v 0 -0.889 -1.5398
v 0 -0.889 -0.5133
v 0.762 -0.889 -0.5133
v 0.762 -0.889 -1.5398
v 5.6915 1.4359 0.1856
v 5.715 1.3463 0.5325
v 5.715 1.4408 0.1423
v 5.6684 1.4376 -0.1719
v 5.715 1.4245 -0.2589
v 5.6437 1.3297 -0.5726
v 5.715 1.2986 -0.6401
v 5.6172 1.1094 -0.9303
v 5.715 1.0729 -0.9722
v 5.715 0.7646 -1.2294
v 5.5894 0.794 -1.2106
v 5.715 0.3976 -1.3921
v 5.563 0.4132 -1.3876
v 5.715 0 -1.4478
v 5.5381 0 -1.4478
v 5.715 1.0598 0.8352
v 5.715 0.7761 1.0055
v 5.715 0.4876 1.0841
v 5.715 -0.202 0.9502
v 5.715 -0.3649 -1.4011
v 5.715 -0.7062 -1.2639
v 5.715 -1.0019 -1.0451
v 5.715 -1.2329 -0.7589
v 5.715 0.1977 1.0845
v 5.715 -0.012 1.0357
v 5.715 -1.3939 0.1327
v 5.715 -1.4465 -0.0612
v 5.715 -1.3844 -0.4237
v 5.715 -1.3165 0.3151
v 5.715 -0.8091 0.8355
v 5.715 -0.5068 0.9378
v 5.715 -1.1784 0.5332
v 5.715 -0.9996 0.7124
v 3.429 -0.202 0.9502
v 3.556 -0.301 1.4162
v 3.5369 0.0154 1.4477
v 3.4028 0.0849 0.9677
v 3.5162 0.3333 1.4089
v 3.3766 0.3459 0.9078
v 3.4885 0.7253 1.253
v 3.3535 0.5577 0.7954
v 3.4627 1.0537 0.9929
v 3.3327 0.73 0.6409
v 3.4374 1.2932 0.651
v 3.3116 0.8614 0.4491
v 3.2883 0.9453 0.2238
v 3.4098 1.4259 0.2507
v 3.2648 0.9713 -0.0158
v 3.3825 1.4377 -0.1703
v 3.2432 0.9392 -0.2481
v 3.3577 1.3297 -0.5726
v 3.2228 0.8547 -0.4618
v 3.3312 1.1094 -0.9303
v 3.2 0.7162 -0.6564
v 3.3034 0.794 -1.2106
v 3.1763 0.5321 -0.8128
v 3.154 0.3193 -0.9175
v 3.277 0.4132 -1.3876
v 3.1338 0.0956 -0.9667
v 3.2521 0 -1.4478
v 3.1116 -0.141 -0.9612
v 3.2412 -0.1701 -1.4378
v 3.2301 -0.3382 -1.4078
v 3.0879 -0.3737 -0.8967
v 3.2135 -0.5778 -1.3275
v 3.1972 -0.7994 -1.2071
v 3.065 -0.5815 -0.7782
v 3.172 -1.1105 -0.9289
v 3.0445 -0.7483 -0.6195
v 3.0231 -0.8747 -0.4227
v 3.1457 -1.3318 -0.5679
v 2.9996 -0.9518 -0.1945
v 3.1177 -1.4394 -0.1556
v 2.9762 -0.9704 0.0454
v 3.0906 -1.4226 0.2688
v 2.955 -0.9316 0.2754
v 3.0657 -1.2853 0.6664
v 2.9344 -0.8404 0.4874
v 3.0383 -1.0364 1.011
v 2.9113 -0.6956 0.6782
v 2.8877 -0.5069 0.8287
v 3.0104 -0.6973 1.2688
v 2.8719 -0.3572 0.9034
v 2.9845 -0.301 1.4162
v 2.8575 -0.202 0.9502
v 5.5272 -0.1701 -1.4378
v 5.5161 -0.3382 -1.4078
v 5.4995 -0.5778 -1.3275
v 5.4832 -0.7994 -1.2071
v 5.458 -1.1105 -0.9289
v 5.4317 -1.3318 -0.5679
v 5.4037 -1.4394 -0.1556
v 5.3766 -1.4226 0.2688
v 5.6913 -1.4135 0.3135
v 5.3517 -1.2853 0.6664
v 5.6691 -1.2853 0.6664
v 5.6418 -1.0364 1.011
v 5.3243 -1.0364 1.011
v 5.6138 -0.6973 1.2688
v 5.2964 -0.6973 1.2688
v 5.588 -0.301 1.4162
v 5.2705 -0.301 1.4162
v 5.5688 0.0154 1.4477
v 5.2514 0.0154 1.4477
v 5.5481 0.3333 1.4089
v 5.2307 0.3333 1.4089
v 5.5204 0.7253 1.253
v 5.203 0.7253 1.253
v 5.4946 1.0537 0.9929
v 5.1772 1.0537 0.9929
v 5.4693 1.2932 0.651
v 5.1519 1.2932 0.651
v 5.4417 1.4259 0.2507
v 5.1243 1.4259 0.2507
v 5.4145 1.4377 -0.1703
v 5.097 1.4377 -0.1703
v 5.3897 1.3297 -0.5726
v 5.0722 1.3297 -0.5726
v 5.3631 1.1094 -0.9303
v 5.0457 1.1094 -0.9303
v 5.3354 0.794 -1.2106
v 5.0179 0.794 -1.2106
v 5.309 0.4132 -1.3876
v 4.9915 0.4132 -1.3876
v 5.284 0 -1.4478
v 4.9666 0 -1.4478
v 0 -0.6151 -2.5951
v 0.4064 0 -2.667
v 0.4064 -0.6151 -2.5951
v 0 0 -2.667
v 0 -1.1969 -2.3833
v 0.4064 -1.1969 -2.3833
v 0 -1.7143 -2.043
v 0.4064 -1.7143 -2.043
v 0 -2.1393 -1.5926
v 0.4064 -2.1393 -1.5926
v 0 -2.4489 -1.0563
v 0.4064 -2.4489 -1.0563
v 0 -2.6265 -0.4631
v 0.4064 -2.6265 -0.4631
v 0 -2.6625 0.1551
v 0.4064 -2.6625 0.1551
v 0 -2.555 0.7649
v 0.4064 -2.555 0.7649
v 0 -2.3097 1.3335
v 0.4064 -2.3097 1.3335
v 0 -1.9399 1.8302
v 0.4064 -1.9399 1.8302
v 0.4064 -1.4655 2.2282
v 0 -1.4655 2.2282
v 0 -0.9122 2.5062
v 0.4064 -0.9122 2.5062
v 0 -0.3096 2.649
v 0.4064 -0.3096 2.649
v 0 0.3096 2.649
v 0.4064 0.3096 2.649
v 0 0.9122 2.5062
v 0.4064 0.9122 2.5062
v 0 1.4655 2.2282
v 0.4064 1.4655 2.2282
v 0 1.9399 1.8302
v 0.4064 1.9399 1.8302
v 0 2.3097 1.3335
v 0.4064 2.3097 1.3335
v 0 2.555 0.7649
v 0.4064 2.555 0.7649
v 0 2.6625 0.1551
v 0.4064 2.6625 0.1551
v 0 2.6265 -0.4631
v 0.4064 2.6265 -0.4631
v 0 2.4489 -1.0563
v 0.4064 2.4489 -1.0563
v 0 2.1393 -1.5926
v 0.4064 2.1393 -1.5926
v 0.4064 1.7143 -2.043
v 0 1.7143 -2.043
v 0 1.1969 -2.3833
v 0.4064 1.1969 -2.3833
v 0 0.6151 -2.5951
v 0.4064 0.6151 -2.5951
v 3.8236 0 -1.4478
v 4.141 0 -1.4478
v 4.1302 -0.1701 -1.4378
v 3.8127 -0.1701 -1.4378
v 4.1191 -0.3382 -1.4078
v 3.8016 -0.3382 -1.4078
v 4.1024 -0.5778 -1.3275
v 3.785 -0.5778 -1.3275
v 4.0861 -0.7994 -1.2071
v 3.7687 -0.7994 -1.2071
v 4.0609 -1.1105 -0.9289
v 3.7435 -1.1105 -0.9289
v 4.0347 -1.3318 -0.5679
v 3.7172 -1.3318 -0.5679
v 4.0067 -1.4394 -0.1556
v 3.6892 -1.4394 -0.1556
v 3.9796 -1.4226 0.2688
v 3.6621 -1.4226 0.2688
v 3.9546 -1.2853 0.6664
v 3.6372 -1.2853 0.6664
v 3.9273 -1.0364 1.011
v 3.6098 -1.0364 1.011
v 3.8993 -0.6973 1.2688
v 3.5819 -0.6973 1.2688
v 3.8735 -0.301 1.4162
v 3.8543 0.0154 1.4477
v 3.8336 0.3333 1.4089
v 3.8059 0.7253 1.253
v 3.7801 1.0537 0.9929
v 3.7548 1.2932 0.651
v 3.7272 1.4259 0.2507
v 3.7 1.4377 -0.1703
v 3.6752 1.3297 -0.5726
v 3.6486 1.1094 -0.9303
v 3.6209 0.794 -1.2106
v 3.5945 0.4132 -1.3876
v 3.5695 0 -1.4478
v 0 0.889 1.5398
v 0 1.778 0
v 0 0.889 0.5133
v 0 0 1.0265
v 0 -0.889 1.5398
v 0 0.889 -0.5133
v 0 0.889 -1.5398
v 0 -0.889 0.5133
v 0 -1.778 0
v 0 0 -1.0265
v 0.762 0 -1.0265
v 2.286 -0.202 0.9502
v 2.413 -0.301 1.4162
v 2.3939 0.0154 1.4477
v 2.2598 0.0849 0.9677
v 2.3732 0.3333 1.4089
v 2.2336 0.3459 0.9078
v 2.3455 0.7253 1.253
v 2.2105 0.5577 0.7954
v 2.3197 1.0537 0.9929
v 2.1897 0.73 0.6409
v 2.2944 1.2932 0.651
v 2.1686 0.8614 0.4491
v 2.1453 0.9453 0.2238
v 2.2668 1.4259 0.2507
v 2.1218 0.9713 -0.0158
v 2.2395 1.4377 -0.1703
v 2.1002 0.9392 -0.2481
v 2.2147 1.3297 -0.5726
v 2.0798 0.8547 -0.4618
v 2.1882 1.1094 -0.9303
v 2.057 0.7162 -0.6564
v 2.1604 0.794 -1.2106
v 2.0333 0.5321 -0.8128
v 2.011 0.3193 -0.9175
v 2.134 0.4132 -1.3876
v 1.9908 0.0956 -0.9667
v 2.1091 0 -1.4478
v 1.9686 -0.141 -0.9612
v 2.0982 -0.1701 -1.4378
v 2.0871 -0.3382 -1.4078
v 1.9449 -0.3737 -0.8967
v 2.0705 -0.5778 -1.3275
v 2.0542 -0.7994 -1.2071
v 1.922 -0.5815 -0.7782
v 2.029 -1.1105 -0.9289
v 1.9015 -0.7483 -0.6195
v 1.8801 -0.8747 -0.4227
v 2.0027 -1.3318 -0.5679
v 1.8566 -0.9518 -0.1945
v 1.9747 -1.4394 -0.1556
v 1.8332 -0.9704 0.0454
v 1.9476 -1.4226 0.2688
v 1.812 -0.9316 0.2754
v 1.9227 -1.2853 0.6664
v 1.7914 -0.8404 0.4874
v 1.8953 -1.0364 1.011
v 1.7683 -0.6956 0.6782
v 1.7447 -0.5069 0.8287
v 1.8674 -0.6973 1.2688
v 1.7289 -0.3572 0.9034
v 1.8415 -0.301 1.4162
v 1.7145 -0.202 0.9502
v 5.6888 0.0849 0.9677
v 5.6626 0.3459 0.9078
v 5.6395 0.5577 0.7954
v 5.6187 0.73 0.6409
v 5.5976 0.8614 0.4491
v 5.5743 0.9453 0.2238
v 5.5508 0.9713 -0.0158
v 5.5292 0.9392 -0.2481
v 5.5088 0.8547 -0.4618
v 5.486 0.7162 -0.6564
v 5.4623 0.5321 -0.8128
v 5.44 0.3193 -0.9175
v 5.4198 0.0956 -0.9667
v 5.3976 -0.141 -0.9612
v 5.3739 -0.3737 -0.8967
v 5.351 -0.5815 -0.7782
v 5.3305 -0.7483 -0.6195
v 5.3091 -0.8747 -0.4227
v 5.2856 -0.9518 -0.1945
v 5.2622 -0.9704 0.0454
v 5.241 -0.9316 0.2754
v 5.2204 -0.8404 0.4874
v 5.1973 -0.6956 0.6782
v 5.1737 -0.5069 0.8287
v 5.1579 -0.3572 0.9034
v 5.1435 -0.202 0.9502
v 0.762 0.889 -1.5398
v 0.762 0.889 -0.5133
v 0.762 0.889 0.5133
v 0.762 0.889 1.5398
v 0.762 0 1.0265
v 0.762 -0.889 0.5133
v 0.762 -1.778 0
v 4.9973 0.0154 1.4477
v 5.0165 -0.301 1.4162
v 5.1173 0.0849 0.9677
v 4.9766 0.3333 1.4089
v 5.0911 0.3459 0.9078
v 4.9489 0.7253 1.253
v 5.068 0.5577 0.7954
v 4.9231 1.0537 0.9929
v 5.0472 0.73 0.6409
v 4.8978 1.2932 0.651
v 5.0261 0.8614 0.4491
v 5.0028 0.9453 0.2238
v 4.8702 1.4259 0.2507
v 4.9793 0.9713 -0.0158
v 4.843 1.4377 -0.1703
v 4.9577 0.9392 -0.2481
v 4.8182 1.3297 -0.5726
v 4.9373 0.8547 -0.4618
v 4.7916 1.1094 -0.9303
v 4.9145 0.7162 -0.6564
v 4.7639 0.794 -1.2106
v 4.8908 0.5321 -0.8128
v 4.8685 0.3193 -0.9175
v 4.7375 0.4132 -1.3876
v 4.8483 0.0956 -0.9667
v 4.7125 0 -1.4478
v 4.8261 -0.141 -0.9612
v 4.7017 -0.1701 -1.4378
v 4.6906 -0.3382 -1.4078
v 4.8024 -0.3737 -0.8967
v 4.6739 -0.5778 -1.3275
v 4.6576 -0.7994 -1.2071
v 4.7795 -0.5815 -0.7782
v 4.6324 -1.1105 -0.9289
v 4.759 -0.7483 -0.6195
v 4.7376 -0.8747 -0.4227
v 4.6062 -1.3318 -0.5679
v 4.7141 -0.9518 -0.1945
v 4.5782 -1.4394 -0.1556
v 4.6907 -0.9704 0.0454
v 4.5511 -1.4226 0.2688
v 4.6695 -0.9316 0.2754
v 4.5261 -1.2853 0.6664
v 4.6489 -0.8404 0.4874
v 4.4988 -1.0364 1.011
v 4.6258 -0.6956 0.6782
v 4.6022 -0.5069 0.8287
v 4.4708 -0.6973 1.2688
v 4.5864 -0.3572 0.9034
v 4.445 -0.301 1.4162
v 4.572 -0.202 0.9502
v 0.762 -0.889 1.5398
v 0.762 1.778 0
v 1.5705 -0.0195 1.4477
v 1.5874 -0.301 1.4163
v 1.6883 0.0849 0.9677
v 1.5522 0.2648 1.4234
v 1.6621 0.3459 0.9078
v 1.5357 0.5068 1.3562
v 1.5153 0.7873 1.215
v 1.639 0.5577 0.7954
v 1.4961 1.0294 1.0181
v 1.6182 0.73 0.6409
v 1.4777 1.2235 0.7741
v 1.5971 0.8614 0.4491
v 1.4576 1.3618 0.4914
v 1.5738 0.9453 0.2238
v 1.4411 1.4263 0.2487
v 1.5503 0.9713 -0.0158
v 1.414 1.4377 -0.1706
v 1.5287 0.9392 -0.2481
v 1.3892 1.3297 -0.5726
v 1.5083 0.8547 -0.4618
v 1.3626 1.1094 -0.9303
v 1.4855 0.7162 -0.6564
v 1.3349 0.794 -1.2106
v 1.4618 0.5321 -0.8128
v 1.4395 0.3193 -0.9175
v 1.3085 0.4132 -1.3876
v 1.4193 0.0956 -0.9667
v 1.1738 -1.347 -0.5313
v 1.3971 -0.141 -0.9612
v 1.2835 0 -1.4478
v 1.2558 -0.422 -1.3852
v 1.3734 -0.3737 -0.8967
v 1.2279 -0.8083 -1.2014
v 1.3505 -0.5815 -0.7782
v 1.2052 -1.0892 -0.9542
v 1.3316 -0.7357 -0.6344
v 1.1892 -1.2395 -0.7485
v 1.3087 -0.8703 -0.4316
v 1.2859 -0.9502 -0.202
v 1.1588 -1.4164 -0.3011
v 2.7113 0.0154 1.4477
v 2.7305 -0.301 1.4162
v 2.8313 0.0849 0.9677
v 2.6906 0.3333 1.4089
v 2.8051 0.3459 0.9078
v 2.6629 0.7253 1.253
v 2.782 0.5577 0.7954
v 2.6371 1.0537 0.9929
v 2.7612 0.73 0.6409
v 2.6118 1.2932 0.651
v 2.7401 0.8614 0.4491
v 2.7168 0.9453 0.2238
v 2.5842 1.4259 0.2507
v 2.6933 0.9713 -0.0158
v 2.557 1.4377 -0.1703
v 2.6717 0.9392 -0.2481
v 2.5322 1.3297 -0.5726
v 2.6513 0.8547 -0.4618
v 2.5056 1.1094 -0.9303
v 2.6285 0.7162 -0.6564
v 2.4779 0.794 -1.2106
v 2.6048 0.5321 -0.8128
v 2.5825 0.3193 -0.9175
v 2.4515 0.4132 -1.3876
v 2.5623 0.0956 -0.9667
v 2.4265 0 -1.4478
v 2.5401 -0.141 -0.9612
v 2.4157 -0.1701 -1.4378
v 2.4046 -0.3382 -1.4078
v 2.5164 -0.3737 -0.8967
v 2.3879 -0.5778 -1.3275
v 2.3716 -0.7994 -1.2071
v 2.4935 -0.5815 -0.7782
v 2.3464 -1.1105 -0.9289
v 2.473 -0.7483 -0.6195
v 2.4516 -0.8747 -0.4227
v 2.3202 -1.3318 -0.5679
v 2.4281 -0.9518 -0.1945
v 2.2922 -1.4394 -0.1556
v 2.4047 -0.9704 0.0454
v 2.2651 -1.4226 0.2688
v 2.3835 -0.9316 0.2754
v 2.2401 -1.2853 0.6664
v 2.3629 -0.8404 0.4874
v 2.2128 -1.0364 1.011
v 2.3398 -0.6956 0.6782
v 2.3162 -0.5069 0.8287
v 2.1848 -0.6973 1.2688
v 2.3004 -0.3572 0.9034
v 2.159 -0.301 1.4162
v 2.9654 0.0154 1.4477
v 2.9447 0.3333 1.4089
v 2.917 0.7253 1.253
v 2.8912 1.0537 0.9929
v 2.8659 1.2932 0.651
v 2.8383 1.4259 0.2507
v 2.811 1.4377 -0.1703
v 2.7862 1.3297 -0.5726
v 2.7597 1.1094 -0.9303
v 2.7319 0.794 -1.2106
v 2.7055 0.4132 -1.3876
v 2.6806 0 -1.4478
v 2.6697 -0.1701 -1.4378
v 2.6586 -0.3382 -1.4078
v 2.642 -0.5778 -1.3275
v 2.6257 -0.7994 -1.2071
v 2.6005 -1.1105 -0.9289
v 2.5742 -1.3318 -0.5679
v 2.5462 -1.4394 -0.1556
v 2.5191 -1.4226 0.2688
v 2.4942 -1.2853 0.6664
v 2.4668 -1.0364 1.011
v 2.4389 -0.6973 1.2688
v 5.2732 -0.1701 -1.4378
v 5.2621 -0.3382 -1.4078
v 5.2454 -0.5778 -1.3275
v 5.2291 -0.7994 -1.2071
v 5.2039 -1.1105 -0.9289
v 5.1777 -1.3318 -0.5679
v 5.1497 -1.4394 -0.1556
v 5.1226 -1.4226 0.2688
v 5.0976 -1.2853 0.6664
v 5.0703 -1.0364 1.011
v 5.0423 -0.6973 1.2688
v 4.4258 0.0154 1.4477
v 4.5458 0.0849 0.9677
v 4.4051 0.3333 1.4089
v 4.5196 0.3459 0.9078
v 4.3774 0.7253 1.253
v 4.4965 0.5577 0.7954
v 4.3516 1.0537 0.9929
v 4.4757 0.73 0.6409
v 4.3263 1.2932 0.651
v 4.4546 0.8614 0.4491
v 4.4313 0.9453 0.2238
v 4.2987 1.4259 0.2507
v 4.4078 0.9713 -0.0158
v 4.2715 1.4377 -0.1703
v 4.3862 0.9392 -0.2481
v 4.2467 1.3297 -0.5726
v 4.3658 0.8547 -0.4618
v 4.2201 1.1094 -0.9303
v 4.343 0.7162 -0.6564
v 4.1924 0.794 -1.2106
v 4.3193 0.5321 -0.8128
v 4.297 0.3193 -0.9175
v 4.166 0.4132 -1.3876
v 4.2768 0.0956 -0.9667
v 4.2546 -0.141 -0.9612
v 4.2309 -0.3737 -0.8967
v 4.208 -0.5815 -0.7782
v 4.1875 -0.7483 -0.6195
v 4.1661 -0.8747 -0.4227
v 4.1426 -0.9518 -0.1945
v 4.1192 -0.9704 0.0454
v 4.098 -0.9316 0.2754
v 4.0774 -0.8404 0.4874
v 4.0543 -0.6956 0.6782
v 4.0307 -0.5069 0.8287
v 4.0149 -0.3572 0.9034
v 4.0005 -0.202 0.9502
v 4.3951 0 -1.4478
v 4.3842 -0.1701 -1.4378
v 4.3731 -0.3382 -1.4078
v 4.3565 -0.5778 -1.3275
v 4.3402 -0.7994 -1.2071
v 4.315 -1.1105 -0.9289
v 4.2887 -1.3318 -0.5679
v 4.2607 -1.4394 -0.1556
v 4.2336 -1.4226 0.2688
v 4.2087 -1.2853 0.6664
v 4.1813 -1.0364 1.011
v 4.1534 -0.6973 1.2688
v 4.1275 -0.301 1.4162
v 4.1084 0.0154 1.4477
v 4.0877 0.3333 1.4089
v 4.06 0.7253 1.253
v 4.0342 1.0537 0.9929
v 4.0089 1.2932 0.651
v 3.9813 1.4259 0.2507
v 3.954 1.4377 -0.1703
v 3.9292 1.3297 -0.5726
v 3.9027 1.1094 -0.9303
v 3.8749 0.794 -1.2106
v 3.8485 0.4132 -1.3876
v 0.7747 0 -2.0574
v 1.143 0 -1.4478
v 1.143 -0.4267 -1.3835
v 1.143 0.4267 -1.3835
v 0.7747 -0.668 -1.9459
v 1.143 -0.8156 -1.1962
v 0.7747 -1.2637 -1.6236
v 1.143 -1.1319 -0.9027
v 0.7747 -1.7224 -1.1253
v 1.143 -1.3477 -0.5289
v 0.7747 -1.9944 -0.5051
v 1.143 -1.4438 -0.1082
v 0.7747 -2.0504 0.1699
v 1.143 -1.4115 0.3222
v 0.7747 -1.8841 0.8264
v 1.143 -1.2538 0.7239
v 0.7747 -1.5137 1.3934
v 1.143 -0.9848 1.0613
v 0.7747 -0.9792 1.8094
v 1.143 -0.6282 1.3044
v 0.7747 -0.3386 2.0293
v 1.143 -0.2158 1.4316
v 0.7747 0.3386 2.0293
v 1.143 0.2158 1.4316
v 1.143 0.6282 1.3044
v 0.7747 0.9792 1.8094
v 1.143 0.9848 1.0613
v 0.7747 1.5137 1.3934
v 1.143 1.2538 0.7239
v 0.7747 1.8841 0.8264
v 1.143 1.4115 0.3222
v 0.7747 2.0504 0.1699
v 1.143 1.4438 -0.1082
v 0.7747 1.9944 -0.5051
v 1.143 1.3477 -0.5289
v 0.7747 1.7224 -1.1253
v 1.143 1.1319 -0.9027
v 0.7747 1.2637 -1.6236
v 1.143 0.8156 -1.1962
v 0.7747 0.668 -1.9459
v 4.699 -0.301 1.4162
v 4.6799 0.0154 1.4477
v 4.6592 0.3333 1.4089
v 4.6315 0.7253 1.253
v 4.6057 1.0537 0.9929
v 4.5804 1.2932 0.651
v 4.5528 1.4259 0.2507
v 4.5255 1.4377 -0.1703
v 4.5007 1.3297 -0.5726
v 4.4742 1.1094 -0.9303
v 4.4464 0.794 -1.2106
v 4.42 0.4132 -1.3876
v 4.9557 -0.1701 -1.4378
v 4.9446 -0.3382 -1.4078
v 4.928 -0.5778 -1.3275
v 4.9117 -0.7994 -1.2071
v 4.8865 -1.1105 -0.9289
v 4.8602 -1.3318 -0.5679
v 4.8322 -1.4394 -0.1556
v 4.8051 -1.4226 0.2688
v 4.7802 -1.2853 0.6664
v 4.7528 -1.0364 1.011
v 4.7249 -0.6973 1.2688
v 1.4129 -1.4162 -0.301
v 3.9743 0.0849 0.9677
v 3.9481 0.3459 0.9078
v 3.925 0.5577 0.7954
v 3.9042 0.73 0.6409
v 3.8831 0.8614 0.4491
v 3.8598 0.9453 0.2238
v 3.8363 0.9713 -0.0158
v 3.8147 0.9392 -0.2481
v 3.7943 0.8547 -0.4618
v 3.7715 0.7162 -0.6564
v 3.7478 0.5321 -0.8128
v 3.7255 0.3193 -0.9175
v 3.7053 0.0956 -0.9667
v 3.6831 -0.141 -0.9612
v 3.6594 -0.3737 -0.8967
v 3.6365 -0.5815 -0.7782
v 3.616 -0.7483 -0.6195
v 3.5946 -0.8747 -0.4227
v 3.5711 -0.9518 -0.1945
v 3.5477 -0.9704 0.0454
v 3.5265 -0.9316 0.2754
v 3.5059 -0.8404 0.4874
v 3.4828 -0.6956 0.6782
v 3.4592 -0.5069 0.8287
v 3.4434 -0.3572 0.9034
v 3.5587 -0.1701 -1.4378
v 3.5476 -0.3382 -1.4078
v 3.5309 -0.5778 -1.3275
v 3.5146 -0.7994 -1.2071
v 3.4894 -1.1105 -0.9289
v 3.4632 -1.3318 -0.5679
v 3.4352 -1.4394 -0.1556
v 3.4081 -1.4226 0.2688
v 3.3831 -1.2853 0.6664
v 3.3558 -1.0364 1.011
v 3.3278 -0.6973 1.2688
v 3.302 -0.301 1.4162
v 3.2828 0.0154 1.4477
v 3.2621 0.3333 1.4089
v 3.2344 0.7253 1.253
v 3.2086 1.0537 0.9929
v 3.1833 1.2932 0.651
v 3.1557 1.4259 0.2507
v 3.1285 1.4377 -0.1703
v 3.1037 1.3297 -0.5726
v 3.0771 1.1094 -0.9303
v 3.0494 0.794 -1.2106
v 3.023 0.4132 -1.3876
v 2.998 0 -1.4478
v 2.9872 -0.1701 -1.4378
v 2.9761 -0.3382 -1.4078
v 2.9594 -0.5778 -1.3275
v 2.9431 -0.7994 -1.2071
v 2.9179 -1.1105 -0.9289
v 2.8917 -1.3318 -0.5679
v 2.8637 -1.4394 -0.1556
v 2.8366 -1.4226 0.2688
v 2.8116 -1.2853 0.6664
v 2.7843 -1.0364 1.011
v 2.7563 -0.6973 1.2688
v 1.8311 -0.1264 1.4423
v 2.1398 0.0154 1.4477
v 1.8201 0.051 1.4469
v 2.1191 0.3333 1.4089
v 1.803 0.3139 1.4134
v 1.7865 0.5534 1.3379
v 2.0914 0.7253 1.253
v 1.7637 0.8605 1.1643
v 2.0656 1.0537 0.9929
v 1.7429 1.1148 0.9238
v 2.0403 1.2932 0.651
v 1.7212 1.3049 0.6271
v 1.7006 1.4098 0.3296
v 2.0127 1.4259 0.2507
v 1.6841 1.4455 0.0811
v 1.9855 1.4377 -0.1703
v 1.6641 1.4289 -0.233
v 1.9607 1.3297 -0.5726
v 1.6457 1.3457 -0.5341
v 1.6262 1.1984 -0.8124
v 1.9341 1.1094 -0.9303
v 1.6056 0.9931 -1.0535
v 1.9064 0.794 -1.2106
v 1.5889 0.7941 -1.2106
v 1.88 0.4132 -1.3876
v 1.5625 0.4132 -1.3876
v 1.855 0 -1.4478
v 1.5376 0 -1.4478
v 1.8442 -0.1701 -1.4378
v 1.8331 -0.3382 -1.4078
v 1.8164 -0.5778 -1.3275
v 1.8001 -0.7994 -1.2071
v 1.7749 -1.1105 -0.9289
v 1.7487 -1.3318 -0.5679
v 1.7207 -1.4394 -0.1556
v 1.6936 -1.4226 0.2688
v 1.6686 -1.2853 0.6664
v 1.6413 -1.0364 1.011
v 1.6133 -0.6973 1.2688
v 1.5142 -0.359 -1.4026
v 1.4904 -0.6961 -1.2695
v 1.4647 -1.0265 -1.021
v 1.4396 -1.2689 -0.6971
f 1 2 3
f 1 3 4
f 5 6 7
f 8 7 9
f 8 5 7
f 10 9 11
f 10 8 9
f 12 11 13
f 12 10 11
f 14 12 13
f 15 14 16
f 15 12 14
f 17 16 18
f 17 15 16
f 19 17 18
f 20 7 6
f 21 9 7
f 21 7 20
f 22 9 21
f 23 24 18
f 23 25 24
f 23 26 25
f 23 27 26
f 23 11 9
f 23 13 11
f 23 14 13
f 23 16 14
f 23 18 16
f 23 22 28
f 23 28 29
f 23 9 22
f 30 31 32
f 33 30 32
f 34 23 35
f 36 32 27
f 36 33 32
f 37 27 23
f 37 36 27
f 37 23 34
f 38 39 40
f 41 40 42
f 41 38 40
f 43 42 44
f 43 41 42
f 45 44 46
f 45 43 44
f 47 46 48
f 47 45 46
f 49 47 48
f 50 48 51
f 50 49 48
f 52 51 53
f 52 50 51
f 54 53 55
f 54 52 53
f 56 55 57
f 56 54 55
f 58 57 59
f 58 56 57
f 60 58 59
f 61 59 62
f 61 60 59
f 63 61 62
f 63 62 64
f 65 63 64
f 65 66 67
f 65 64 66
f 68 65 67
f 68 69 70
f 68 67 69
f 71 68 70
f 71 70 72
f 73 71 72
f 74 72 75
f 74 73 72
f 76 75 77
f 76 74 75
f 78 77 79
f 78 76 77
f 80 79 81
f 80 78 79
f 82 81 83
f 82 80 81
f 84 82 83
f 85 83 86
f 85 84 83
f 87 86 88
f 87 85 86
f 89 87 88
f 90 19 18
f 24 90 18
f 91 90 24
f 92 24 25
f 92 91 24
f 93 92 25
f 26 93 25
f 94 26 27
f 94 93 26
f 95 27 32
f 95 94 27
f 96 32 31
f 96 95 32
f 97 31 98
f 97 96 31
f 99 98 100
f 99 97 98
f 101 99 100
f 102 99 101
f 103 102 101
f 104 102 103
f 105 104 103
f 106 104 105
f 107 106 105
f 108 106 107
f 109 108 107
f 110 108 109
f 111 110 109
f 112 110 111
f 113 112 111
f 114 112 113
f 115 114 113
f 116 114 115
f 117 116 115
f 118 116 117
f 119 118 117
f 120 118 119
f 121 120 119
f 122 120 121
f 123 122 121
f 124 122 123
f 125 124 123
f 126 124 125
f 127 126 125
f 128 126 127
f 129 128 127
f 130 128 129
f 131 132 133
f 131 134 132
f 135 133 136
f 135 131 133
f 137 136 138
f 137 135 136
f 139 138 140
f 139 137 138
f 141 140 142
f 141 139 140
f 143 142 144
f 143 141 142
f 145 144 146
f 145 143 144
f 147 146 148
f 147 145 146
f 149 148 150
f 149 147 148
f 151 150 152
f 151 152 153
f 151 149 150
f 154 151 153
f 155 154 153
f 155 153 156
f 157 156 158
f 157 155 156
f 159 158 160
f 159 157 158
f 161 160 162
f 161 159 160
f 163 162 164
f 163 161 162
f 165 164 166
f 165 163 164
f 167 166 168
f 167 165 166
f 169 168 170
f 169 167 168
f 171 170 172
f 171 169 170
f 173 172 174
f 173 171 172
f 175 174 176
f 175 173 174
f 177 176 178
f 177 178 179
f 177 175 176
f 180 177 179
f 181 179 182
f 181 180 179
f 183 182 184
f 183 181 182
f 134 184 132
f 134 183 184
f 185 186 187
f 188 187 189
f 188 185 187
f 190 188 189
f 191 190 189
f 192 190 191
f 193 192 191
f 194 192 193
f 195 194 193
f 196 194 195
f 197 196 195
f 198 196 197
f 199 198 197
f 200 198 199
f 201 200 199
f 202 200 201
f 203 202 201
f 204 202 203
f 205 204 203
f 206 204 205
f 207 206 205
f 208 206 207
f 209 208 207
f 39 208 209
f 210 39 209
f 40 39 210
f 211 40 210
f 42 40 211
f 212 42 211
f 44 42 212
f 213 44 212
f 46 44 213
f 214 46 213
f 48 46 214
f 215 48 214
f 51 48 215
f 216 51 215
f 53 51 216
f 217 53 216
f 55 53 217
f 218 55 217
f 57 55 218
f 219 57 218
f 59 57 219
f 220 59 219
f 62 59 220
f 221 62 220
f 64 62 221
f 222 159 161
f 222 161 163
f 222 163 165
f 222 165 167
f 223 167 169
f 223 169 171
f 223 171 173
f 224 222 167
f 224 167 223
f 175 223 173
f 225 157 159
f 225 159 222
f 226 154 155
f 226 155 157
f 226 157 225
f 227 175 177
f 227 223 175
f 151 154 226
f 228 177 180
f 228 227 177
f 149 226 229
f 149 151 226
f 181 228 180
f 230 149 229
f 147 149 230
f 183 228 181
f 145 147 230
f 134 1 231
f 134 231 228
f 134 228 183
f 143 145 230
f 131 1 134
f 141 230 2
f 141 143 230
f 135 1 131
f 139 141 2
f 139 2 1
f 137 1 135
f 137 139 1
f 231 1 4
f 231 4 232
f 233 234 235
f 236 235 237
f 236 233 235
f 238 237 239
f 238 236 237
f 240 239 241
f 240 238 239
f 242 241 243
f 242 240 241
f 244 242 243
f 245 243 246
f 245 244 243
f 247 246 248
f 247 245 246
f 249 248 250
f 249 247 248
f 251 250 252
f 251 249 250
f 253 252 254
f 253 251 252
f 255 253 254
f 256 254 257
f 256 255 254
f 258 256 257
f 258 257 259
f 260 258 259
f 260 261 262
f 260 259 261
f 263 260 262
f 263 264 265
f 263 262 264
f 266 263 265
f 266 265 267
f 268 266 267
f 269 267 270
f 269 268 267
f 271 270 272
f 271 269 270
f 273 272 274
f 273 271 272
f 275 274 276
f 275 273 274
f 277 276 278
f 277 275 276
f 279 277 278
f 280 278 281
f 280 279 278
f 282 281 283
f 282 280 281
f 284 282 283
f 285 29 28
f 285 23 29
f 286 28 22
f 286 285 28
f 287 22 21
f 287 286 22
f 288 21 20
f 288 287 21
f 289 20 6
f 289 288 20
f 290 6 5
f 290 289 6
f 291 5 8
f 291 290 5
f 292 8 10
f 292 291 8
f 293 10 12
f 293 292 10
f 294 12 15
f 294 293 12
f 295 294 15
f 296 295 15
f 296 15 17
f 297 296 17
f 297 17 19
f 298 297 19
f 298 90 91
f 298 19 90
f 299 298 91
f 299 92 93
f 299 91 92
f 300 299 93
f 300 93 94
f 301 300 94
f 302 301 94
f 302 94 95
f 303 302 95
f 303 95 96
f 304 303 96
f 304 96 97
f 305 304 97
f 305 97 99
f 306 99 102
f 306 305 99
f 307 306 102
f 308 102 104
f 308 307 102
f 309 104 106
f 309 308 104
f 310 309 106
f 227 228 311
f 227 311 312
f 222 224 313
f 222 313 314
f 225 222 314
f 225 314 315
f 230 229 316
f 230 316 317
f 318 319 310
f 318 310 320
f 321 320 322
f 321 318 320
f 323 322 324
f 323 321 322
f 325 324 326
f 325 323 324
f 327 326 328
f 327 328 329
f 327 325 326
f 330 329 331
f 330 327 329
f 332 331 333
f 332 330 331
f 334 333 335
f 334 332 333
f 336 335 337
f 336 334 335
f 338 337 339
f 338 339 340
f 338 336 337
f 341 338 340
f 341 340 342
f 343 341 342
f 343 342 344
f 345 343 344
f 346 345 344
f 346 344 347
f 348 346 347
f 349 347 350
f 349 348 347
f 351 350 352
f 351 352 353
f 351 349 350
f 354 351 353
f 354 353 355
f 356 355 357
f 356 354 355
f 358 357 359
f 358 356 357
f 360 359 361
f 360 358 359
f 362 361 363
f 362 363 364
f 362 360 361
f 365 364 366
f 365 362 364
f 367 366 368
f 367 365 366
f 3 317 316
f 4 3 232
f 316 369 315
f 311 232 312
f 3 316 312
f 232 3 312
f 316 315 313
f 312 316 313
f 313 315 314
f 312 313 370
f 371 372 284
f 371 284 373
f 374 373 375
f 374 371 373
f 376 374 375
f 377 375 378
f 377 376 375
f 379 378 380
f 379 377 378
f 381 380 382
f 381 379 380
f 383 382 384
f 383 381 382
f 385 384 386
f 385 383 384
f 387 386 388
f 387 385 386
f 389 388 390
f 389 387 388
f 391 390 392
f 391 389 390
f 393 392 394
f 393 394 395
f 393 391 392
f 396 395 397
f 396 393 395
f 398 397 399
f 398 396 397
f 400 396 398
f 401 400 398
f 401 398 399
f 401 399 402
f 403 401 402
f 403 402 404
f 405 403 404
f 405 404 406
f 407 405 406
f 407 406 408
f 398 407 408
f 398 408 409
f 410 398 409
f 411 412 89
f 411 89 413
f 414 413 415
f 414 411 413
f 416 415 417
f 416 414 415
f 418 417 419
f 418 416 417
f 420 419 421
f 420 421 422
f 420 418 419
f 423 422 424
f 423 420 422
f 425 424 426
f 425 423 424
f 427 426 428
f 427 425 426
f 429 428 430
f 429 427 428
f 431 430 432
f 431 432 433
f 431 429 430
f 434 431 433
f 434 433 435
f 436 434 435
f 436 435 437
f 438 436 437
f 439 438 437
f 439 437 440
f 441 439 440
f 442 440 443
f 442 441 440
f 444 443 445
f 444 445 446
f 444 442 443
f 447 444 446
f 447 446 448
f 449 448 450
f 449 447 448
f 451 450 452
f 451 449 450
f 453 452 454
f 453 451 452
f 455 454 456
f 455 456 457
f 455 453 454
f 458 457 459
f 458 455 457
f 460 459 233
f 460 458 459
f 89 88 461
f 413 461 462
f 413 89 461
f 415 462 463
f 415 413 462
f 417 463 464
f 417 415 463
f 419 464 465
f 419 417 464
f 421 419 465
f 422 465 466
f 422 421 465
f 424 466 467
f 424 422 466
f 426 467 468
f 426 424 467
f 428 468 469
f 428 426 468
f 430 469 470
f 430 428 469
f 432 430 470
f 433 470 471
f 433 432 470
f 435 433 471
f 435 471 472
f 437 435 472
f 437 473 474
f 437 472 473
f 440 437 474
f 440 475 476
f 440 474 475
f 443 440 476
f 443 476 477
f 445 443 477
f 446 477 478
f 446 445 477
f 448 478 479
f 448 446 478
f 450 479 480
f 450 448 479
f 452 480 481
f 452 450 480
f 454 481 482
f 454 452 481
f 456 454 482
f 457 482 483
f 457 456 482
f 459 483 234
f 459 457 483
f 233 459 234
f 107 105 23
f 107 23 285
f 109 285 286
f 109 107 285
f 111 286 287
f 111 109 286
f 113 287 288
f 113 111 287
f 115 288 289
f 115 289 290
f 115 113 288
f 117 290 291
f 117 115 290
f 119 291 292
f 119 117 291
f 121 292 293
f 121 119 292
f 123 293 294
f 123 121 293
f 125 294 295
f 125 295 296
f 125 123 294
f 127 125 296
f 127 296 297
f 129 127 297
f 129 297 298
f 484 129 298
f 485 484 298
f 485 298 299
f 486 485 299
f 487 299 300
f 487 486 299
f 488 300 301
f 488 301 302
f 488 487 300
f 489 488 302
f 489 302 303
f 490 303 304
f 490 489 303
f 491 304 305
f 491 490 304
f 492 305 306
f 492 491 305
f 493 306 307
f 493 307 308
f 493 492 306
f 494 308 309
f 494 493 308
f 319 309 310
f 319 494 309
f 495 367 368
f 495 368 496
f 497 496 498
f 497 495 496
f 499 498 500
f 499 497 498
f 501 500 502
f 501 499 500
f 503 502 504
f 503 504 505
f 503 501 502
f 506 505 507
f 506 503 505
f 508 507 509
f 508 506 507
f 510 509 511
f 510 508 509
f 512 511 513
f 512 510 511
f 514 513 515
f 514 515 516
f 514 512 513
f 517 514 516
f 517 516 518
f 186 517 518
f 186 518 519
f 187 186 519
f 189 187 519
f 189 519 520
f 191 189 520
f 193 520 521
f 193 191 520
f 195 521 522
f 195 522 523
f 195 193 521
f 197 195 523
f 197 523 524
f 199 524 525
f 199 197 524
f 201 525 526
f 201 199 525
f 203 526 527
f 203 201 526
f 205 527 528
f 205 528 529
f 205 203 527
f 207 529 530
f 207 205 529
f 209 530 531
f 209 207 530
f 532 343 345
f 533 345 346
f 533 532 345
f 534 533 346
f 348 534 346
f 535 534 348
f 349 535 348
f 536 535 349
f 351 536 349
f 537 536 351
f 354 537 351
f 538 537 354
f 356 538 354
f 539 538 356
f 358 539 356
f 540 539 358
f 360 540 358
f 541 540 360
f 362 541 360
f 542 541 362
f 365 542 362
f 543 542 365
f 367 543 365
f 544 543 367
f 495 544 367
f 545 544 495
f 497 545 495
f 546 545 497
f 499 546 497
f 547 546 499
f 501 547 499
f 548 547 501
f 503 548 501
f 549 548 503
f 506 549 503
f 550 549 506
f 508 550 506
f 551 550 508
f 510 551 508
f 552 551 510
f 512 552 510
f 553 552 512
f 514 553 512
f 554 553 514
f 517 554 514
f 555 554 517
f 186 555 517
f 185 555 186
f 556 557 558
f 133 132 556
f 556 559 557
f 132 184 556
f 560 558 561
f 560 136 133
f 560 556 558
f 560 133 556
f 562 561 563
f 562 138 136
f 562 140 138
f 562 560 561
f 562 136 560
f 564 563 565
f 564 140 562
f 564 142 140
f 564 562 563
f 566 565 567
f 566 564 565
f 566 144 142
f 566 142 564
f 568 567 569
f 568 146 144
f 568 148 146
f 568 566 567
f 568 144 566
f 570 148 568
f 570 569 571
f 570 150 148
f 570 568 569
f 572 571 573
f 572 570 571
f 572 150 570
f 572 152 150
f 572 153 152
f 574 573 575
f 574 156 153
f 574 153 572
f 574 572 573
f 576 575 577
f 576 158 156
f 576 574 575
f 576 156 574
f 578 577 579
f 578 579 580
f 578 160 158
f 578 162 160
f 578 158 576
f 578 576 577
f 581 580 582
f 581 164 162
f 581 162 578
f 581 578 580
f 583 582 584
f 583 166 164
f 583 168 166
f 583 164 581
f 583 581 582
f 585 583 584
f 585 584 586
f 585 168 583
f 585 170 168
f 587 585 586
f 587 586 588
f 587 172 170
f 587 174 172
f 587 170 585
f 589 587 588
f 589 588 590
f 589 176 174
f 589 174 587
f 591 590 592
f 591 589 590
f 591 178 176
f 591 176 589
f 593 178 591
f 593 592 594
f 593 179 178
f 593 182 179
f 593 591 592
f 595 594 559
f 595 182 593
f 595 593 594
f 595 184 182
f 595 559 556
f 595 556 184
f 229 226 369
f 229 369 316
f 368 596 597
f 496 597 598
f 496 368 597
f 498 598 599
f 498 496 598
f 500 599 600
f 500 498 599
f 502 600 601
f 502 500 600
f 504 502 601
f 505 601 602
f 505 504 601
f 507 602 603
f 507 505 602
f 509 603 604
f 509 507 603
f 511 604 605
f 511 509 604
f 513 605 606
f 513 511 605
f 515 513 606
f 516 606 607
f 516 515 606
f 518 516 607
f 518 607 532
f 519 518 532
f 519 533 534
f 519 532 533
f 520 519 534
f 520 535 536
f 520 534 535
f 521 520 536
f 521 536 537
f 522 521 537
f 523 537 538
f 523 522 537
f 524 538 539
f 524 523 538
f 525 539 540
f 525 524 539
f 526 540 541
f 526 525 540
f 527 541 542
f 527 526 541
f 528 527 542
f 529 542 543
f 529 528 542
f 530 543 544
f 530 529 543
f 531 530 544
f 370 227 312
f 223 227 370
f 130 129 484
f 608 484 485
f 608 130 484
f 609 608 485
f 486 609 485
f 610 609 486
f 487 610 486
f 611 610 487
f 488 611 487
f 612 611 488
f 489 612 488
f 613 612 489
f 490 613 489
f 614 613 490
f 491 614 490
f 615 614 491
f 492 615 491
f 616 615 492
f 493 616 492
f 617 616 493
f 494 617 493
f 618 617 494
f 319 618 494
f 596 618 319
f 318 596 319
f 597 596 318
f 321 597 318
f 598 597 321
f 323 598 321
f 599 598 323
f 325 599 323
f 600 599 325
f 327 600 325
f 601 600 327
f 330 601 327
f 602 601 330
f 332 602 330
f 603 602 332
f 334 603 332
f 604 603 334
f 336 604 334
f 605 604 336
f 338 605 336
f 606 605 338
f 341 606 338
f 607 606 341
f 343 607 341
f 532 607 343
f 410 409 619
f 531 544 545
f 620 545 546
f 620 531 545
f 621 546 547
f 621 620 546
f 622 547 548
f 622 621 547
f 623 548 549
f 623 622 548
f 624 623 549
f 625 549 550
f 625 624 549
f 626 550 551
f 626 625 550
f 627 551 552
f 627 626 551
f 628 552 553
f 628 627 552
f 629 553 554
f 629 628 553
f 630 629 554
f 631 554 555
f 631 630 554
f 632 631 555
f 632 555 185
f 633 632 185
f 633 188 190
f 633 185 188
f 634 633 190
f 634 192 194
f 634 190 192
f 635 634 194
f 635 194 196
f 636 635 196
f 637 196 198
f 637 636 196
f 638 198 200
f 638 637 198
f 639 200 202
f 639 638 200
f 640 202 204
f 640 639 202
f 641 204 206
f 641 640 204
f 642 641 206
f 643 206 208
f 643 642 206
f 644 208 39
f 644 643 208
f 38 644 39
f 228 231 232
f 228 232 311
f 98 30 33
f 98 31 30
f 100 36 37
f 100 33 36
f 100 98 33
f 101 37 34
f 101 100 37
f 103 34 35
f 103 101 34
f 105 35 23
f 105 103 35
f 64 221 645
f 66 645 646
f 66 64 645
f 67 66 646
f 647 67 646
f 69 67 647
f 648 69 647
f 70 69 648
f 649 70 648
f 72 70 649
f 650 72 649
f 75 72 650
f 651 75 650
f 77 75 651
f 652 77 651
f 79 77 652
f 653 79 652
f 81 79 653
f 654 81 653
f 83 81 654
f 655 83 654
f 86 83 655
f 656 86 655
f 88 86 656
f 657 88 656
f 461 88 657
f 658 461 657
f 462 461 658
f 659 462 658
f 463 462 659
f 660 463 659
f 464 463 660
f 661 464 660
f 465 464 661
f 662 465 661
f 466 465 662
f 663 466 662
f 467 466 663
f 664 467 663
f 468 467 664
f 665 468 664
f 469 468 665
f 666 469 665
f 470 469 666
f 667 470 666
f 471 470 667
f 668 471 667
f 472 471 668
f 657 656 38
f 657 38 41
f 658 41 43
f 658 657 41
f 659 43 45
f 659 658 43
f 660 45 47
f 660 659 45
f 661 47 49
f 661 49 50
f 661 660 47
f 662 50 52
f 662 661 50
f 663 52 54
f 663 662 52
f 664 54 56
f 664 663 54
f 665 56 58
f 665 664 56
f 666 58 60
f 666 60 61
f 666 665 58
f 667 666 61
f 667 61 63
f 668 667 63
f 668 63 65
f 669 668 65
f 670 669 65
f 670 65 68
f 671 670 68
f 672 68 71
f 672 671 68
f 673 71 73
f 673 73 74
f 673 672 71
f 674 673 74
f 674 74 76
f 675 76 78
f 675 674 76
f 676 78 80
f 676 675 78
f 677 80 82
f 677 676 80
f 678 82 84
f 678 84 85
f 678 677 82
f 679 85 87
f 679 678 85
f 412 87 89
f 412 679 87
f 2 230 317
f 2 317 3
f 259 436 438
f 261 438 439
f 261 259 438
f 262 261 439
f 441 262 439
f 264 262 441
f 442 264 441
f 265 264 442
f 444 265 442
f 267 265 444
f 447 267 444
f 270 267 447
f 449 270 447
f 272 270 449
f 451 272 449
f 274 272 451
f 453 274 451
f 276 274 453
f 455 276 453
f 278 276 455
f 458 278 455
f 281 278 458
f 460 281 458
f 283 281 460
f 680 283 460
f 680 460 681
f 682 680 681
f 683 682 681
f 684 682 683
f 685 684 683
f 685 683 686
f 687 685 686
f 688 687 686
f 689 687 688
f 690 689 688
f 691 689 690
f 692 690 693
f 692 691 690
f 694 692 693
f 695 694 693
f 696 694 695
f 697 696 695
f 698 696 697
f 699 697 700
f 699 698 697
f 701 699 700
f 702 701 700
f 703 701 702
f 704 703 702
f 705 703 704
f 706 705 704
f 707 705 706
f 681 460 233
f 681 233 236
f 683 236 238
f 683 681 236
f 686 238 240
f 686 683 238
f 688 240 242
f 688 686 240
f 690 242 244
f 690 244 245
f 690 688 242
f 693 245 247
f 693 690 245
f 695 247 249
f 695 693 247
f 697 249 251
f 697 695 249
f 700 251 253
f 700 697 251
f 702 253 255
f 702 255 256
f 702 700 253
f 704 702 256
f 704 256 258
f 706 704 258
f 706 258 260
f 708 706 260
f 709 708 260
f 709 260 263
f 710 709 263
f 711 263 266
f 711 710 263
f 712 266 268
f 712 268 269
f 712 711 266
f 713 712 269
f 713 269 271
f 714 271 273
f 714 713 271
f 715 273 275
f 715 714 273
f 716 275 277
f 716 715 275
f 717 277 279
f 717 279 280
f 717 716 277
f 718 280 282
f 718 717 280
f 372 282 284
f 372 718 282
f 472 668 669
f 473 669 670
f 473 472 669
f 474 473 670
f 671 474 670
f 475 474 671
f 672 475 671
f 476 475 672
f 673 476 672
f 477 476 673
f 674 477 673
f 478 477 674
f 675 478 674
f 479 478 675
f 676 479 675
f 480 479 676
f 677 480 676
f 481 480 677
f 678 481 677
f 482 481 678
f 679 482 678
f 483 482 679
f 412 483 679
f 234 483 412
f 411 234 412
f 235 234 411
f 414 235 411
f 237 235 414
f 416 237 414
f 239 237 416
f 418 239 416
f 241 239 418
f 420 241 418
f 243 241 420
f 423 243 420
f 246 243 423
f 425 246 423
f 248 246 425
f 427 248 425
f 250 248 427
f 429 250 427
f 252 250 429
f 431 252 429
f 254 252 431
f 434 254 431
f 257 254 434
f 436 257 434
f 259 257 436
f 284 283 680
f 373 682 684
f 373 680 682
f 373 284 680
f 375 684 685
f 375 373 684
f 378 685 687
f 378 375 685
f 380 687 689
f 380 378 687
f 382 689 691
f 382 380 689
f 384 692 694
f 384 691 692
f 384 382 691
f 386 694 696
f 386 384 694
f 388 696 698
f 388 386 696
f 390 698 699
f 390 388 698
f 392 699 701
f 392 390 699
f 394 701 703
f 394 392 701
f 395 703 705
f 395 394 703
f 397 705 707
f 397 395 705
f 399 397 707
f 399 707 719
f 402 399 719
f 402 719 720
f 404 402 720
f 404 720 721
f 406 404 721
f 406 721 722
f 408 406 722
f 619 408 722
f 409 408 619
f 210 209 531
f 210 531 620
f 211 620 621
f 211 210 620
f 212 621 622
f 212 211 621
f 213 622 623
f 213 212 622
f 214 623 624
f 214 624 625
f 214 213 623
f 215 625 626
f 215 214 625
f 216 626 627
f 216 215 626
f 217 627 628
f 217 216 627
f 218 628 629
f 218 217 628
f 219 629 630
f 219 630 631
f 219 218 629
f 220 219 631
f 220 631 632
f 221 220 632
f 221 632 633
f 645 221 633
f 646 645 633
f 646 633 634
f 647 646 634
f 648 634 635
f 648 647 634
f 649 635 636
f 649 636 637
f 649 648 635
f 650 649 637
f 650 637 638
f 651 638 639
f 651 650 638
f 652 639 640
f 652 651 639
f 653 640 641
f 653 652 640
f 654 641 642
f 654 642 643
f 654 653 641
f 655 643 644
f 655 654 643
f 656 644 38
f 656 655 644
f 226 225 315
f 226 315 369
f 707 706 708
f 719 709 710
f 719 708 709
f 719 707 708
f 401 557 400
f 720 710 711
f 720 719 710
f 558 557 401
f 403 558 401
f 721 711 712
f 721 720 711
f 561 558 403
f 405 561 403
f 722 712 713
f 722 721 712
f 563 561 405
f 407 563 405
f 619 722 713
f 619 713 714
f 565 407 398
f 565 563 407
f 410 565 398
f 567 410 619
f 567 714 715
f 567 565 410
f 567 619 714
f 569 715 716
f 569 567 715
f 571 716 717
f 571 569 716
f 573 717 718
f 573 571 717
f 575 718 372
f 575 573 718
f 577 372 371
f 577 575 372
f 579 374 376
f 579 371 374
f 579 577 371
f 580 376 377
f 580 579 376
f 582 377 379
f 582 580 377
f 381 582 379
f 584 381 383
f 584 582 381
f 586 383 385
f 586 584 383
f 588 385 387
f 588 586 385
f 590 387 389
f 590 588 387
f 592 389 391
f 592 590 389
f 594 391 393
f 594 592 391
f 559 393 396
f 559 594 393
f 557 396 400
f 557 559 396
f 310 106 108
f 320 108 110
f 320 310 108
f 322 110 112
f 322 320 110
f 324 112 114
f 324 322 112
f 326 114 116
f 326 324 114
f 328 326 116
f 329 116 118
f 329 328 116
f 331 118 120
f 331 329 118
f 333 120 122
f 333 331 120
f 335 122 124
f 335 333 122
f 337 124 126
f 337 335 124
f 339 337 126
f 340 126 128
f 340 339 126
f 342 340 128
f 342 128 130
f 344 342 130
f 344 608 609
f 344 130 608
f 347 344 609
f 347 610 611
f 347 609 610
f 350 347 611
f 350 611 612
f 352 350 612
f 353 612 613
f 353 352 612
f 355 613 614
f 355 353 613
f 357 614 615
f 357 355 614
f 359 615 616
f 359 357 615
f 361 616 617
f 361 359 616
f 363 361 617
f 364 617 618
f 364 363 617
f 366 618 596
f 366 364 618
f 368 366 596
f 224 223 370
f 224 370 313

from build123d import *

# Parameters (mm, degrees)
CUT_EXTRUDE1_DEPTH = 0.762
CIRPATTERN1_COUNT  = 6
CUT_SWEEP1_PITCH   = 0.5715


with BuildPart() as part:
    # Sketch1 → Revolve1 (revolve)
    with BuildSketch(Plane.XY, mode=Mode.PRIVATE) as revolve1_sk:
        Polygon((0, 0), (5.715, 0), (5.715, 1.4478), (1.143, 1.4478), (0.4064, 2.667), (0, 2.667), align=None)
    revolve(revolve1_sk.sketch.rotate(Axis((0, 0, 0), (-1, 0, 0)), 90), axis=Axis((0, 0, 0), (-1, 0, 0)))

    # Sketch2 → Cut-Extrude1 (cut)
    with BuildSketch(Plane.ZY):
        Polygon((0, 1.778), (0.513264389, 0.889), (1.539793168, 0.889), (0, 0), align=None)
    cut_extrude1 = extrude(amount=-CUT_EXTRUDE1_DEPTH, mode=Mode.SUBTRACT)

    # CirPattern1: Cut-Extrude1 ×6 about axis
    cirpattern1_axis = Axis((0, 0, 0), (1, 0, 0))
    for i in range(1, CIRPATTERN1_COUNT):
        add(cut_extrude1.rotate(cirpattern1_axis, i * 360 / CIRPATTERN1_COUNT), mode=Mode.SUBTRACT)

    # Cut-Sweep1: arcs per turn and ends read off the stored shape
    # Cut-Sweep1: the profile of Sketch5 profile screwed along a right-hand helix through 8.75 turns, 6 arcs to a turn; built about Z, then put on its axis
    cut_sweep1_z = Axis((0, 0, 0), (0, 0, 1))
    cut_sweep1_corners = [(1.448004946, 5.56e-06, -0.444420005), (1.448004946, 5.56e-06, -0.698580005), (0.971454946, 3.73e-06, -0.571500005)]
    with BuildLine(mode=Mode.PRIVATE) as cut_sweep1_profile:
        Line(cut_sweep1_corners[0], cut_sweep1_corners[1])
        Line(cut_sweep1_corners[1], cut_sweep1_corners[2])
        Line(cut_sweep1_corners[2], cut_sweep1_corners[0])
    cut_sweep1_cap = Face(cut_sweep1_profile.wire())
    cut_sweep1_turn_angles = [0, 30, 60, 90, 120, 150, 180, 210, 240, 270, 300, 330, 360]
    cut_sweep1_turn_weights = [1, 0.8660254037844387, 1, 0.8660254037844387, 1, 0.8660254037844387, 1, 0.8660254037844387, 1, 0.8660254037844387, 1, 0.8660254037844387, 1]
    cut_sweep1_turn_rails = [Edge.make_bspline([Vector(p[0], p[1], 0).rotate(cut_sweep1_z, cut_sweep1_turn_angles[k]) / cut_sweep1_turn_weights[k] + Vector(0, 0, p[2] + CUT_SWEEP1_PITCH * cut_sweep1_turn_angles[k] / 360) for k in range(13)], [0, 0, 0, 1, 1, 2, 2, 3, 3, 4, 4, 5, 5, 6, 6, 6], 2, cut_sweep1_turn_weights) for p in cut_sweep1_corners]
    cut_sweep1_turn_sides = [Face.make_surface_from_curves(cut_sweep1_turn_rails[p[0]], cut_sweep1_turn_rails[p[1]]) for p in [(0, 1), (1, 2), (2, 0)]]
    cut_sweep1_last_angles = [2880, 2910, 2940, 2970, 3000, 3030, 3060, 3090, 3120, 3135, 3150]
    cut_sweep1_last_weights = [1, 0.8660254037844387, 1, 0.8660254037844387, 1, 0.8660254037844387, 1, 0.8660254037844387, 1, 0.9659258262890683, 1]
    cut_sweep1_last_rails = [Edge.make_bspline([Vector(p[0], p[1], 0).rotate(cut_sweep1_z, cut_sweep1_last_angles[k]) / cut_sweep1_last_weights[k] + Vector(0, 0, p[2] + CUT_SWEEP1_PITCH * cut_sweep1_last_angles[k] / 360) for k in range(11)], [0, 0, 0, 1, 1, 2, 2, 3, 3, 4, 4, 5, 5, 5], 2, cut_sweep1_last_weights) for p in cut_sweep1_corners]
    cut_sweep1_last_sides = [Face.make_surface_from_curves(cut_sweep1_last_rails[p[0]], cut_sweep1_last_rails[p[1]]) for p in [(0, 1), (1, 2), (2, 0)]]
    cut_sweep1 = Plane(origin=(5.715, 0, 0), x_dir=(0, -0.2079116908177638, 0.9781476007338047), z_dir=(-1, 0, 0)) * Solid(Shell([*[p.moved(Location((0, 0, CUT_SWEEP1_PITCH * i))) for i in range(8) for p in cut_sweep1_turn_sides], *cut_sweep1_last_sides, cut_sweep1_cap, cut_sweep1_cap.rotate(cut_sweep1_z, 3150).moved(Location((0, 0, CUT_SWEEP1_PITCH * 3150 / 360)))]))
    add(cut_sweep1, mode=Mode.SUBTRACT)


solid = part.part
